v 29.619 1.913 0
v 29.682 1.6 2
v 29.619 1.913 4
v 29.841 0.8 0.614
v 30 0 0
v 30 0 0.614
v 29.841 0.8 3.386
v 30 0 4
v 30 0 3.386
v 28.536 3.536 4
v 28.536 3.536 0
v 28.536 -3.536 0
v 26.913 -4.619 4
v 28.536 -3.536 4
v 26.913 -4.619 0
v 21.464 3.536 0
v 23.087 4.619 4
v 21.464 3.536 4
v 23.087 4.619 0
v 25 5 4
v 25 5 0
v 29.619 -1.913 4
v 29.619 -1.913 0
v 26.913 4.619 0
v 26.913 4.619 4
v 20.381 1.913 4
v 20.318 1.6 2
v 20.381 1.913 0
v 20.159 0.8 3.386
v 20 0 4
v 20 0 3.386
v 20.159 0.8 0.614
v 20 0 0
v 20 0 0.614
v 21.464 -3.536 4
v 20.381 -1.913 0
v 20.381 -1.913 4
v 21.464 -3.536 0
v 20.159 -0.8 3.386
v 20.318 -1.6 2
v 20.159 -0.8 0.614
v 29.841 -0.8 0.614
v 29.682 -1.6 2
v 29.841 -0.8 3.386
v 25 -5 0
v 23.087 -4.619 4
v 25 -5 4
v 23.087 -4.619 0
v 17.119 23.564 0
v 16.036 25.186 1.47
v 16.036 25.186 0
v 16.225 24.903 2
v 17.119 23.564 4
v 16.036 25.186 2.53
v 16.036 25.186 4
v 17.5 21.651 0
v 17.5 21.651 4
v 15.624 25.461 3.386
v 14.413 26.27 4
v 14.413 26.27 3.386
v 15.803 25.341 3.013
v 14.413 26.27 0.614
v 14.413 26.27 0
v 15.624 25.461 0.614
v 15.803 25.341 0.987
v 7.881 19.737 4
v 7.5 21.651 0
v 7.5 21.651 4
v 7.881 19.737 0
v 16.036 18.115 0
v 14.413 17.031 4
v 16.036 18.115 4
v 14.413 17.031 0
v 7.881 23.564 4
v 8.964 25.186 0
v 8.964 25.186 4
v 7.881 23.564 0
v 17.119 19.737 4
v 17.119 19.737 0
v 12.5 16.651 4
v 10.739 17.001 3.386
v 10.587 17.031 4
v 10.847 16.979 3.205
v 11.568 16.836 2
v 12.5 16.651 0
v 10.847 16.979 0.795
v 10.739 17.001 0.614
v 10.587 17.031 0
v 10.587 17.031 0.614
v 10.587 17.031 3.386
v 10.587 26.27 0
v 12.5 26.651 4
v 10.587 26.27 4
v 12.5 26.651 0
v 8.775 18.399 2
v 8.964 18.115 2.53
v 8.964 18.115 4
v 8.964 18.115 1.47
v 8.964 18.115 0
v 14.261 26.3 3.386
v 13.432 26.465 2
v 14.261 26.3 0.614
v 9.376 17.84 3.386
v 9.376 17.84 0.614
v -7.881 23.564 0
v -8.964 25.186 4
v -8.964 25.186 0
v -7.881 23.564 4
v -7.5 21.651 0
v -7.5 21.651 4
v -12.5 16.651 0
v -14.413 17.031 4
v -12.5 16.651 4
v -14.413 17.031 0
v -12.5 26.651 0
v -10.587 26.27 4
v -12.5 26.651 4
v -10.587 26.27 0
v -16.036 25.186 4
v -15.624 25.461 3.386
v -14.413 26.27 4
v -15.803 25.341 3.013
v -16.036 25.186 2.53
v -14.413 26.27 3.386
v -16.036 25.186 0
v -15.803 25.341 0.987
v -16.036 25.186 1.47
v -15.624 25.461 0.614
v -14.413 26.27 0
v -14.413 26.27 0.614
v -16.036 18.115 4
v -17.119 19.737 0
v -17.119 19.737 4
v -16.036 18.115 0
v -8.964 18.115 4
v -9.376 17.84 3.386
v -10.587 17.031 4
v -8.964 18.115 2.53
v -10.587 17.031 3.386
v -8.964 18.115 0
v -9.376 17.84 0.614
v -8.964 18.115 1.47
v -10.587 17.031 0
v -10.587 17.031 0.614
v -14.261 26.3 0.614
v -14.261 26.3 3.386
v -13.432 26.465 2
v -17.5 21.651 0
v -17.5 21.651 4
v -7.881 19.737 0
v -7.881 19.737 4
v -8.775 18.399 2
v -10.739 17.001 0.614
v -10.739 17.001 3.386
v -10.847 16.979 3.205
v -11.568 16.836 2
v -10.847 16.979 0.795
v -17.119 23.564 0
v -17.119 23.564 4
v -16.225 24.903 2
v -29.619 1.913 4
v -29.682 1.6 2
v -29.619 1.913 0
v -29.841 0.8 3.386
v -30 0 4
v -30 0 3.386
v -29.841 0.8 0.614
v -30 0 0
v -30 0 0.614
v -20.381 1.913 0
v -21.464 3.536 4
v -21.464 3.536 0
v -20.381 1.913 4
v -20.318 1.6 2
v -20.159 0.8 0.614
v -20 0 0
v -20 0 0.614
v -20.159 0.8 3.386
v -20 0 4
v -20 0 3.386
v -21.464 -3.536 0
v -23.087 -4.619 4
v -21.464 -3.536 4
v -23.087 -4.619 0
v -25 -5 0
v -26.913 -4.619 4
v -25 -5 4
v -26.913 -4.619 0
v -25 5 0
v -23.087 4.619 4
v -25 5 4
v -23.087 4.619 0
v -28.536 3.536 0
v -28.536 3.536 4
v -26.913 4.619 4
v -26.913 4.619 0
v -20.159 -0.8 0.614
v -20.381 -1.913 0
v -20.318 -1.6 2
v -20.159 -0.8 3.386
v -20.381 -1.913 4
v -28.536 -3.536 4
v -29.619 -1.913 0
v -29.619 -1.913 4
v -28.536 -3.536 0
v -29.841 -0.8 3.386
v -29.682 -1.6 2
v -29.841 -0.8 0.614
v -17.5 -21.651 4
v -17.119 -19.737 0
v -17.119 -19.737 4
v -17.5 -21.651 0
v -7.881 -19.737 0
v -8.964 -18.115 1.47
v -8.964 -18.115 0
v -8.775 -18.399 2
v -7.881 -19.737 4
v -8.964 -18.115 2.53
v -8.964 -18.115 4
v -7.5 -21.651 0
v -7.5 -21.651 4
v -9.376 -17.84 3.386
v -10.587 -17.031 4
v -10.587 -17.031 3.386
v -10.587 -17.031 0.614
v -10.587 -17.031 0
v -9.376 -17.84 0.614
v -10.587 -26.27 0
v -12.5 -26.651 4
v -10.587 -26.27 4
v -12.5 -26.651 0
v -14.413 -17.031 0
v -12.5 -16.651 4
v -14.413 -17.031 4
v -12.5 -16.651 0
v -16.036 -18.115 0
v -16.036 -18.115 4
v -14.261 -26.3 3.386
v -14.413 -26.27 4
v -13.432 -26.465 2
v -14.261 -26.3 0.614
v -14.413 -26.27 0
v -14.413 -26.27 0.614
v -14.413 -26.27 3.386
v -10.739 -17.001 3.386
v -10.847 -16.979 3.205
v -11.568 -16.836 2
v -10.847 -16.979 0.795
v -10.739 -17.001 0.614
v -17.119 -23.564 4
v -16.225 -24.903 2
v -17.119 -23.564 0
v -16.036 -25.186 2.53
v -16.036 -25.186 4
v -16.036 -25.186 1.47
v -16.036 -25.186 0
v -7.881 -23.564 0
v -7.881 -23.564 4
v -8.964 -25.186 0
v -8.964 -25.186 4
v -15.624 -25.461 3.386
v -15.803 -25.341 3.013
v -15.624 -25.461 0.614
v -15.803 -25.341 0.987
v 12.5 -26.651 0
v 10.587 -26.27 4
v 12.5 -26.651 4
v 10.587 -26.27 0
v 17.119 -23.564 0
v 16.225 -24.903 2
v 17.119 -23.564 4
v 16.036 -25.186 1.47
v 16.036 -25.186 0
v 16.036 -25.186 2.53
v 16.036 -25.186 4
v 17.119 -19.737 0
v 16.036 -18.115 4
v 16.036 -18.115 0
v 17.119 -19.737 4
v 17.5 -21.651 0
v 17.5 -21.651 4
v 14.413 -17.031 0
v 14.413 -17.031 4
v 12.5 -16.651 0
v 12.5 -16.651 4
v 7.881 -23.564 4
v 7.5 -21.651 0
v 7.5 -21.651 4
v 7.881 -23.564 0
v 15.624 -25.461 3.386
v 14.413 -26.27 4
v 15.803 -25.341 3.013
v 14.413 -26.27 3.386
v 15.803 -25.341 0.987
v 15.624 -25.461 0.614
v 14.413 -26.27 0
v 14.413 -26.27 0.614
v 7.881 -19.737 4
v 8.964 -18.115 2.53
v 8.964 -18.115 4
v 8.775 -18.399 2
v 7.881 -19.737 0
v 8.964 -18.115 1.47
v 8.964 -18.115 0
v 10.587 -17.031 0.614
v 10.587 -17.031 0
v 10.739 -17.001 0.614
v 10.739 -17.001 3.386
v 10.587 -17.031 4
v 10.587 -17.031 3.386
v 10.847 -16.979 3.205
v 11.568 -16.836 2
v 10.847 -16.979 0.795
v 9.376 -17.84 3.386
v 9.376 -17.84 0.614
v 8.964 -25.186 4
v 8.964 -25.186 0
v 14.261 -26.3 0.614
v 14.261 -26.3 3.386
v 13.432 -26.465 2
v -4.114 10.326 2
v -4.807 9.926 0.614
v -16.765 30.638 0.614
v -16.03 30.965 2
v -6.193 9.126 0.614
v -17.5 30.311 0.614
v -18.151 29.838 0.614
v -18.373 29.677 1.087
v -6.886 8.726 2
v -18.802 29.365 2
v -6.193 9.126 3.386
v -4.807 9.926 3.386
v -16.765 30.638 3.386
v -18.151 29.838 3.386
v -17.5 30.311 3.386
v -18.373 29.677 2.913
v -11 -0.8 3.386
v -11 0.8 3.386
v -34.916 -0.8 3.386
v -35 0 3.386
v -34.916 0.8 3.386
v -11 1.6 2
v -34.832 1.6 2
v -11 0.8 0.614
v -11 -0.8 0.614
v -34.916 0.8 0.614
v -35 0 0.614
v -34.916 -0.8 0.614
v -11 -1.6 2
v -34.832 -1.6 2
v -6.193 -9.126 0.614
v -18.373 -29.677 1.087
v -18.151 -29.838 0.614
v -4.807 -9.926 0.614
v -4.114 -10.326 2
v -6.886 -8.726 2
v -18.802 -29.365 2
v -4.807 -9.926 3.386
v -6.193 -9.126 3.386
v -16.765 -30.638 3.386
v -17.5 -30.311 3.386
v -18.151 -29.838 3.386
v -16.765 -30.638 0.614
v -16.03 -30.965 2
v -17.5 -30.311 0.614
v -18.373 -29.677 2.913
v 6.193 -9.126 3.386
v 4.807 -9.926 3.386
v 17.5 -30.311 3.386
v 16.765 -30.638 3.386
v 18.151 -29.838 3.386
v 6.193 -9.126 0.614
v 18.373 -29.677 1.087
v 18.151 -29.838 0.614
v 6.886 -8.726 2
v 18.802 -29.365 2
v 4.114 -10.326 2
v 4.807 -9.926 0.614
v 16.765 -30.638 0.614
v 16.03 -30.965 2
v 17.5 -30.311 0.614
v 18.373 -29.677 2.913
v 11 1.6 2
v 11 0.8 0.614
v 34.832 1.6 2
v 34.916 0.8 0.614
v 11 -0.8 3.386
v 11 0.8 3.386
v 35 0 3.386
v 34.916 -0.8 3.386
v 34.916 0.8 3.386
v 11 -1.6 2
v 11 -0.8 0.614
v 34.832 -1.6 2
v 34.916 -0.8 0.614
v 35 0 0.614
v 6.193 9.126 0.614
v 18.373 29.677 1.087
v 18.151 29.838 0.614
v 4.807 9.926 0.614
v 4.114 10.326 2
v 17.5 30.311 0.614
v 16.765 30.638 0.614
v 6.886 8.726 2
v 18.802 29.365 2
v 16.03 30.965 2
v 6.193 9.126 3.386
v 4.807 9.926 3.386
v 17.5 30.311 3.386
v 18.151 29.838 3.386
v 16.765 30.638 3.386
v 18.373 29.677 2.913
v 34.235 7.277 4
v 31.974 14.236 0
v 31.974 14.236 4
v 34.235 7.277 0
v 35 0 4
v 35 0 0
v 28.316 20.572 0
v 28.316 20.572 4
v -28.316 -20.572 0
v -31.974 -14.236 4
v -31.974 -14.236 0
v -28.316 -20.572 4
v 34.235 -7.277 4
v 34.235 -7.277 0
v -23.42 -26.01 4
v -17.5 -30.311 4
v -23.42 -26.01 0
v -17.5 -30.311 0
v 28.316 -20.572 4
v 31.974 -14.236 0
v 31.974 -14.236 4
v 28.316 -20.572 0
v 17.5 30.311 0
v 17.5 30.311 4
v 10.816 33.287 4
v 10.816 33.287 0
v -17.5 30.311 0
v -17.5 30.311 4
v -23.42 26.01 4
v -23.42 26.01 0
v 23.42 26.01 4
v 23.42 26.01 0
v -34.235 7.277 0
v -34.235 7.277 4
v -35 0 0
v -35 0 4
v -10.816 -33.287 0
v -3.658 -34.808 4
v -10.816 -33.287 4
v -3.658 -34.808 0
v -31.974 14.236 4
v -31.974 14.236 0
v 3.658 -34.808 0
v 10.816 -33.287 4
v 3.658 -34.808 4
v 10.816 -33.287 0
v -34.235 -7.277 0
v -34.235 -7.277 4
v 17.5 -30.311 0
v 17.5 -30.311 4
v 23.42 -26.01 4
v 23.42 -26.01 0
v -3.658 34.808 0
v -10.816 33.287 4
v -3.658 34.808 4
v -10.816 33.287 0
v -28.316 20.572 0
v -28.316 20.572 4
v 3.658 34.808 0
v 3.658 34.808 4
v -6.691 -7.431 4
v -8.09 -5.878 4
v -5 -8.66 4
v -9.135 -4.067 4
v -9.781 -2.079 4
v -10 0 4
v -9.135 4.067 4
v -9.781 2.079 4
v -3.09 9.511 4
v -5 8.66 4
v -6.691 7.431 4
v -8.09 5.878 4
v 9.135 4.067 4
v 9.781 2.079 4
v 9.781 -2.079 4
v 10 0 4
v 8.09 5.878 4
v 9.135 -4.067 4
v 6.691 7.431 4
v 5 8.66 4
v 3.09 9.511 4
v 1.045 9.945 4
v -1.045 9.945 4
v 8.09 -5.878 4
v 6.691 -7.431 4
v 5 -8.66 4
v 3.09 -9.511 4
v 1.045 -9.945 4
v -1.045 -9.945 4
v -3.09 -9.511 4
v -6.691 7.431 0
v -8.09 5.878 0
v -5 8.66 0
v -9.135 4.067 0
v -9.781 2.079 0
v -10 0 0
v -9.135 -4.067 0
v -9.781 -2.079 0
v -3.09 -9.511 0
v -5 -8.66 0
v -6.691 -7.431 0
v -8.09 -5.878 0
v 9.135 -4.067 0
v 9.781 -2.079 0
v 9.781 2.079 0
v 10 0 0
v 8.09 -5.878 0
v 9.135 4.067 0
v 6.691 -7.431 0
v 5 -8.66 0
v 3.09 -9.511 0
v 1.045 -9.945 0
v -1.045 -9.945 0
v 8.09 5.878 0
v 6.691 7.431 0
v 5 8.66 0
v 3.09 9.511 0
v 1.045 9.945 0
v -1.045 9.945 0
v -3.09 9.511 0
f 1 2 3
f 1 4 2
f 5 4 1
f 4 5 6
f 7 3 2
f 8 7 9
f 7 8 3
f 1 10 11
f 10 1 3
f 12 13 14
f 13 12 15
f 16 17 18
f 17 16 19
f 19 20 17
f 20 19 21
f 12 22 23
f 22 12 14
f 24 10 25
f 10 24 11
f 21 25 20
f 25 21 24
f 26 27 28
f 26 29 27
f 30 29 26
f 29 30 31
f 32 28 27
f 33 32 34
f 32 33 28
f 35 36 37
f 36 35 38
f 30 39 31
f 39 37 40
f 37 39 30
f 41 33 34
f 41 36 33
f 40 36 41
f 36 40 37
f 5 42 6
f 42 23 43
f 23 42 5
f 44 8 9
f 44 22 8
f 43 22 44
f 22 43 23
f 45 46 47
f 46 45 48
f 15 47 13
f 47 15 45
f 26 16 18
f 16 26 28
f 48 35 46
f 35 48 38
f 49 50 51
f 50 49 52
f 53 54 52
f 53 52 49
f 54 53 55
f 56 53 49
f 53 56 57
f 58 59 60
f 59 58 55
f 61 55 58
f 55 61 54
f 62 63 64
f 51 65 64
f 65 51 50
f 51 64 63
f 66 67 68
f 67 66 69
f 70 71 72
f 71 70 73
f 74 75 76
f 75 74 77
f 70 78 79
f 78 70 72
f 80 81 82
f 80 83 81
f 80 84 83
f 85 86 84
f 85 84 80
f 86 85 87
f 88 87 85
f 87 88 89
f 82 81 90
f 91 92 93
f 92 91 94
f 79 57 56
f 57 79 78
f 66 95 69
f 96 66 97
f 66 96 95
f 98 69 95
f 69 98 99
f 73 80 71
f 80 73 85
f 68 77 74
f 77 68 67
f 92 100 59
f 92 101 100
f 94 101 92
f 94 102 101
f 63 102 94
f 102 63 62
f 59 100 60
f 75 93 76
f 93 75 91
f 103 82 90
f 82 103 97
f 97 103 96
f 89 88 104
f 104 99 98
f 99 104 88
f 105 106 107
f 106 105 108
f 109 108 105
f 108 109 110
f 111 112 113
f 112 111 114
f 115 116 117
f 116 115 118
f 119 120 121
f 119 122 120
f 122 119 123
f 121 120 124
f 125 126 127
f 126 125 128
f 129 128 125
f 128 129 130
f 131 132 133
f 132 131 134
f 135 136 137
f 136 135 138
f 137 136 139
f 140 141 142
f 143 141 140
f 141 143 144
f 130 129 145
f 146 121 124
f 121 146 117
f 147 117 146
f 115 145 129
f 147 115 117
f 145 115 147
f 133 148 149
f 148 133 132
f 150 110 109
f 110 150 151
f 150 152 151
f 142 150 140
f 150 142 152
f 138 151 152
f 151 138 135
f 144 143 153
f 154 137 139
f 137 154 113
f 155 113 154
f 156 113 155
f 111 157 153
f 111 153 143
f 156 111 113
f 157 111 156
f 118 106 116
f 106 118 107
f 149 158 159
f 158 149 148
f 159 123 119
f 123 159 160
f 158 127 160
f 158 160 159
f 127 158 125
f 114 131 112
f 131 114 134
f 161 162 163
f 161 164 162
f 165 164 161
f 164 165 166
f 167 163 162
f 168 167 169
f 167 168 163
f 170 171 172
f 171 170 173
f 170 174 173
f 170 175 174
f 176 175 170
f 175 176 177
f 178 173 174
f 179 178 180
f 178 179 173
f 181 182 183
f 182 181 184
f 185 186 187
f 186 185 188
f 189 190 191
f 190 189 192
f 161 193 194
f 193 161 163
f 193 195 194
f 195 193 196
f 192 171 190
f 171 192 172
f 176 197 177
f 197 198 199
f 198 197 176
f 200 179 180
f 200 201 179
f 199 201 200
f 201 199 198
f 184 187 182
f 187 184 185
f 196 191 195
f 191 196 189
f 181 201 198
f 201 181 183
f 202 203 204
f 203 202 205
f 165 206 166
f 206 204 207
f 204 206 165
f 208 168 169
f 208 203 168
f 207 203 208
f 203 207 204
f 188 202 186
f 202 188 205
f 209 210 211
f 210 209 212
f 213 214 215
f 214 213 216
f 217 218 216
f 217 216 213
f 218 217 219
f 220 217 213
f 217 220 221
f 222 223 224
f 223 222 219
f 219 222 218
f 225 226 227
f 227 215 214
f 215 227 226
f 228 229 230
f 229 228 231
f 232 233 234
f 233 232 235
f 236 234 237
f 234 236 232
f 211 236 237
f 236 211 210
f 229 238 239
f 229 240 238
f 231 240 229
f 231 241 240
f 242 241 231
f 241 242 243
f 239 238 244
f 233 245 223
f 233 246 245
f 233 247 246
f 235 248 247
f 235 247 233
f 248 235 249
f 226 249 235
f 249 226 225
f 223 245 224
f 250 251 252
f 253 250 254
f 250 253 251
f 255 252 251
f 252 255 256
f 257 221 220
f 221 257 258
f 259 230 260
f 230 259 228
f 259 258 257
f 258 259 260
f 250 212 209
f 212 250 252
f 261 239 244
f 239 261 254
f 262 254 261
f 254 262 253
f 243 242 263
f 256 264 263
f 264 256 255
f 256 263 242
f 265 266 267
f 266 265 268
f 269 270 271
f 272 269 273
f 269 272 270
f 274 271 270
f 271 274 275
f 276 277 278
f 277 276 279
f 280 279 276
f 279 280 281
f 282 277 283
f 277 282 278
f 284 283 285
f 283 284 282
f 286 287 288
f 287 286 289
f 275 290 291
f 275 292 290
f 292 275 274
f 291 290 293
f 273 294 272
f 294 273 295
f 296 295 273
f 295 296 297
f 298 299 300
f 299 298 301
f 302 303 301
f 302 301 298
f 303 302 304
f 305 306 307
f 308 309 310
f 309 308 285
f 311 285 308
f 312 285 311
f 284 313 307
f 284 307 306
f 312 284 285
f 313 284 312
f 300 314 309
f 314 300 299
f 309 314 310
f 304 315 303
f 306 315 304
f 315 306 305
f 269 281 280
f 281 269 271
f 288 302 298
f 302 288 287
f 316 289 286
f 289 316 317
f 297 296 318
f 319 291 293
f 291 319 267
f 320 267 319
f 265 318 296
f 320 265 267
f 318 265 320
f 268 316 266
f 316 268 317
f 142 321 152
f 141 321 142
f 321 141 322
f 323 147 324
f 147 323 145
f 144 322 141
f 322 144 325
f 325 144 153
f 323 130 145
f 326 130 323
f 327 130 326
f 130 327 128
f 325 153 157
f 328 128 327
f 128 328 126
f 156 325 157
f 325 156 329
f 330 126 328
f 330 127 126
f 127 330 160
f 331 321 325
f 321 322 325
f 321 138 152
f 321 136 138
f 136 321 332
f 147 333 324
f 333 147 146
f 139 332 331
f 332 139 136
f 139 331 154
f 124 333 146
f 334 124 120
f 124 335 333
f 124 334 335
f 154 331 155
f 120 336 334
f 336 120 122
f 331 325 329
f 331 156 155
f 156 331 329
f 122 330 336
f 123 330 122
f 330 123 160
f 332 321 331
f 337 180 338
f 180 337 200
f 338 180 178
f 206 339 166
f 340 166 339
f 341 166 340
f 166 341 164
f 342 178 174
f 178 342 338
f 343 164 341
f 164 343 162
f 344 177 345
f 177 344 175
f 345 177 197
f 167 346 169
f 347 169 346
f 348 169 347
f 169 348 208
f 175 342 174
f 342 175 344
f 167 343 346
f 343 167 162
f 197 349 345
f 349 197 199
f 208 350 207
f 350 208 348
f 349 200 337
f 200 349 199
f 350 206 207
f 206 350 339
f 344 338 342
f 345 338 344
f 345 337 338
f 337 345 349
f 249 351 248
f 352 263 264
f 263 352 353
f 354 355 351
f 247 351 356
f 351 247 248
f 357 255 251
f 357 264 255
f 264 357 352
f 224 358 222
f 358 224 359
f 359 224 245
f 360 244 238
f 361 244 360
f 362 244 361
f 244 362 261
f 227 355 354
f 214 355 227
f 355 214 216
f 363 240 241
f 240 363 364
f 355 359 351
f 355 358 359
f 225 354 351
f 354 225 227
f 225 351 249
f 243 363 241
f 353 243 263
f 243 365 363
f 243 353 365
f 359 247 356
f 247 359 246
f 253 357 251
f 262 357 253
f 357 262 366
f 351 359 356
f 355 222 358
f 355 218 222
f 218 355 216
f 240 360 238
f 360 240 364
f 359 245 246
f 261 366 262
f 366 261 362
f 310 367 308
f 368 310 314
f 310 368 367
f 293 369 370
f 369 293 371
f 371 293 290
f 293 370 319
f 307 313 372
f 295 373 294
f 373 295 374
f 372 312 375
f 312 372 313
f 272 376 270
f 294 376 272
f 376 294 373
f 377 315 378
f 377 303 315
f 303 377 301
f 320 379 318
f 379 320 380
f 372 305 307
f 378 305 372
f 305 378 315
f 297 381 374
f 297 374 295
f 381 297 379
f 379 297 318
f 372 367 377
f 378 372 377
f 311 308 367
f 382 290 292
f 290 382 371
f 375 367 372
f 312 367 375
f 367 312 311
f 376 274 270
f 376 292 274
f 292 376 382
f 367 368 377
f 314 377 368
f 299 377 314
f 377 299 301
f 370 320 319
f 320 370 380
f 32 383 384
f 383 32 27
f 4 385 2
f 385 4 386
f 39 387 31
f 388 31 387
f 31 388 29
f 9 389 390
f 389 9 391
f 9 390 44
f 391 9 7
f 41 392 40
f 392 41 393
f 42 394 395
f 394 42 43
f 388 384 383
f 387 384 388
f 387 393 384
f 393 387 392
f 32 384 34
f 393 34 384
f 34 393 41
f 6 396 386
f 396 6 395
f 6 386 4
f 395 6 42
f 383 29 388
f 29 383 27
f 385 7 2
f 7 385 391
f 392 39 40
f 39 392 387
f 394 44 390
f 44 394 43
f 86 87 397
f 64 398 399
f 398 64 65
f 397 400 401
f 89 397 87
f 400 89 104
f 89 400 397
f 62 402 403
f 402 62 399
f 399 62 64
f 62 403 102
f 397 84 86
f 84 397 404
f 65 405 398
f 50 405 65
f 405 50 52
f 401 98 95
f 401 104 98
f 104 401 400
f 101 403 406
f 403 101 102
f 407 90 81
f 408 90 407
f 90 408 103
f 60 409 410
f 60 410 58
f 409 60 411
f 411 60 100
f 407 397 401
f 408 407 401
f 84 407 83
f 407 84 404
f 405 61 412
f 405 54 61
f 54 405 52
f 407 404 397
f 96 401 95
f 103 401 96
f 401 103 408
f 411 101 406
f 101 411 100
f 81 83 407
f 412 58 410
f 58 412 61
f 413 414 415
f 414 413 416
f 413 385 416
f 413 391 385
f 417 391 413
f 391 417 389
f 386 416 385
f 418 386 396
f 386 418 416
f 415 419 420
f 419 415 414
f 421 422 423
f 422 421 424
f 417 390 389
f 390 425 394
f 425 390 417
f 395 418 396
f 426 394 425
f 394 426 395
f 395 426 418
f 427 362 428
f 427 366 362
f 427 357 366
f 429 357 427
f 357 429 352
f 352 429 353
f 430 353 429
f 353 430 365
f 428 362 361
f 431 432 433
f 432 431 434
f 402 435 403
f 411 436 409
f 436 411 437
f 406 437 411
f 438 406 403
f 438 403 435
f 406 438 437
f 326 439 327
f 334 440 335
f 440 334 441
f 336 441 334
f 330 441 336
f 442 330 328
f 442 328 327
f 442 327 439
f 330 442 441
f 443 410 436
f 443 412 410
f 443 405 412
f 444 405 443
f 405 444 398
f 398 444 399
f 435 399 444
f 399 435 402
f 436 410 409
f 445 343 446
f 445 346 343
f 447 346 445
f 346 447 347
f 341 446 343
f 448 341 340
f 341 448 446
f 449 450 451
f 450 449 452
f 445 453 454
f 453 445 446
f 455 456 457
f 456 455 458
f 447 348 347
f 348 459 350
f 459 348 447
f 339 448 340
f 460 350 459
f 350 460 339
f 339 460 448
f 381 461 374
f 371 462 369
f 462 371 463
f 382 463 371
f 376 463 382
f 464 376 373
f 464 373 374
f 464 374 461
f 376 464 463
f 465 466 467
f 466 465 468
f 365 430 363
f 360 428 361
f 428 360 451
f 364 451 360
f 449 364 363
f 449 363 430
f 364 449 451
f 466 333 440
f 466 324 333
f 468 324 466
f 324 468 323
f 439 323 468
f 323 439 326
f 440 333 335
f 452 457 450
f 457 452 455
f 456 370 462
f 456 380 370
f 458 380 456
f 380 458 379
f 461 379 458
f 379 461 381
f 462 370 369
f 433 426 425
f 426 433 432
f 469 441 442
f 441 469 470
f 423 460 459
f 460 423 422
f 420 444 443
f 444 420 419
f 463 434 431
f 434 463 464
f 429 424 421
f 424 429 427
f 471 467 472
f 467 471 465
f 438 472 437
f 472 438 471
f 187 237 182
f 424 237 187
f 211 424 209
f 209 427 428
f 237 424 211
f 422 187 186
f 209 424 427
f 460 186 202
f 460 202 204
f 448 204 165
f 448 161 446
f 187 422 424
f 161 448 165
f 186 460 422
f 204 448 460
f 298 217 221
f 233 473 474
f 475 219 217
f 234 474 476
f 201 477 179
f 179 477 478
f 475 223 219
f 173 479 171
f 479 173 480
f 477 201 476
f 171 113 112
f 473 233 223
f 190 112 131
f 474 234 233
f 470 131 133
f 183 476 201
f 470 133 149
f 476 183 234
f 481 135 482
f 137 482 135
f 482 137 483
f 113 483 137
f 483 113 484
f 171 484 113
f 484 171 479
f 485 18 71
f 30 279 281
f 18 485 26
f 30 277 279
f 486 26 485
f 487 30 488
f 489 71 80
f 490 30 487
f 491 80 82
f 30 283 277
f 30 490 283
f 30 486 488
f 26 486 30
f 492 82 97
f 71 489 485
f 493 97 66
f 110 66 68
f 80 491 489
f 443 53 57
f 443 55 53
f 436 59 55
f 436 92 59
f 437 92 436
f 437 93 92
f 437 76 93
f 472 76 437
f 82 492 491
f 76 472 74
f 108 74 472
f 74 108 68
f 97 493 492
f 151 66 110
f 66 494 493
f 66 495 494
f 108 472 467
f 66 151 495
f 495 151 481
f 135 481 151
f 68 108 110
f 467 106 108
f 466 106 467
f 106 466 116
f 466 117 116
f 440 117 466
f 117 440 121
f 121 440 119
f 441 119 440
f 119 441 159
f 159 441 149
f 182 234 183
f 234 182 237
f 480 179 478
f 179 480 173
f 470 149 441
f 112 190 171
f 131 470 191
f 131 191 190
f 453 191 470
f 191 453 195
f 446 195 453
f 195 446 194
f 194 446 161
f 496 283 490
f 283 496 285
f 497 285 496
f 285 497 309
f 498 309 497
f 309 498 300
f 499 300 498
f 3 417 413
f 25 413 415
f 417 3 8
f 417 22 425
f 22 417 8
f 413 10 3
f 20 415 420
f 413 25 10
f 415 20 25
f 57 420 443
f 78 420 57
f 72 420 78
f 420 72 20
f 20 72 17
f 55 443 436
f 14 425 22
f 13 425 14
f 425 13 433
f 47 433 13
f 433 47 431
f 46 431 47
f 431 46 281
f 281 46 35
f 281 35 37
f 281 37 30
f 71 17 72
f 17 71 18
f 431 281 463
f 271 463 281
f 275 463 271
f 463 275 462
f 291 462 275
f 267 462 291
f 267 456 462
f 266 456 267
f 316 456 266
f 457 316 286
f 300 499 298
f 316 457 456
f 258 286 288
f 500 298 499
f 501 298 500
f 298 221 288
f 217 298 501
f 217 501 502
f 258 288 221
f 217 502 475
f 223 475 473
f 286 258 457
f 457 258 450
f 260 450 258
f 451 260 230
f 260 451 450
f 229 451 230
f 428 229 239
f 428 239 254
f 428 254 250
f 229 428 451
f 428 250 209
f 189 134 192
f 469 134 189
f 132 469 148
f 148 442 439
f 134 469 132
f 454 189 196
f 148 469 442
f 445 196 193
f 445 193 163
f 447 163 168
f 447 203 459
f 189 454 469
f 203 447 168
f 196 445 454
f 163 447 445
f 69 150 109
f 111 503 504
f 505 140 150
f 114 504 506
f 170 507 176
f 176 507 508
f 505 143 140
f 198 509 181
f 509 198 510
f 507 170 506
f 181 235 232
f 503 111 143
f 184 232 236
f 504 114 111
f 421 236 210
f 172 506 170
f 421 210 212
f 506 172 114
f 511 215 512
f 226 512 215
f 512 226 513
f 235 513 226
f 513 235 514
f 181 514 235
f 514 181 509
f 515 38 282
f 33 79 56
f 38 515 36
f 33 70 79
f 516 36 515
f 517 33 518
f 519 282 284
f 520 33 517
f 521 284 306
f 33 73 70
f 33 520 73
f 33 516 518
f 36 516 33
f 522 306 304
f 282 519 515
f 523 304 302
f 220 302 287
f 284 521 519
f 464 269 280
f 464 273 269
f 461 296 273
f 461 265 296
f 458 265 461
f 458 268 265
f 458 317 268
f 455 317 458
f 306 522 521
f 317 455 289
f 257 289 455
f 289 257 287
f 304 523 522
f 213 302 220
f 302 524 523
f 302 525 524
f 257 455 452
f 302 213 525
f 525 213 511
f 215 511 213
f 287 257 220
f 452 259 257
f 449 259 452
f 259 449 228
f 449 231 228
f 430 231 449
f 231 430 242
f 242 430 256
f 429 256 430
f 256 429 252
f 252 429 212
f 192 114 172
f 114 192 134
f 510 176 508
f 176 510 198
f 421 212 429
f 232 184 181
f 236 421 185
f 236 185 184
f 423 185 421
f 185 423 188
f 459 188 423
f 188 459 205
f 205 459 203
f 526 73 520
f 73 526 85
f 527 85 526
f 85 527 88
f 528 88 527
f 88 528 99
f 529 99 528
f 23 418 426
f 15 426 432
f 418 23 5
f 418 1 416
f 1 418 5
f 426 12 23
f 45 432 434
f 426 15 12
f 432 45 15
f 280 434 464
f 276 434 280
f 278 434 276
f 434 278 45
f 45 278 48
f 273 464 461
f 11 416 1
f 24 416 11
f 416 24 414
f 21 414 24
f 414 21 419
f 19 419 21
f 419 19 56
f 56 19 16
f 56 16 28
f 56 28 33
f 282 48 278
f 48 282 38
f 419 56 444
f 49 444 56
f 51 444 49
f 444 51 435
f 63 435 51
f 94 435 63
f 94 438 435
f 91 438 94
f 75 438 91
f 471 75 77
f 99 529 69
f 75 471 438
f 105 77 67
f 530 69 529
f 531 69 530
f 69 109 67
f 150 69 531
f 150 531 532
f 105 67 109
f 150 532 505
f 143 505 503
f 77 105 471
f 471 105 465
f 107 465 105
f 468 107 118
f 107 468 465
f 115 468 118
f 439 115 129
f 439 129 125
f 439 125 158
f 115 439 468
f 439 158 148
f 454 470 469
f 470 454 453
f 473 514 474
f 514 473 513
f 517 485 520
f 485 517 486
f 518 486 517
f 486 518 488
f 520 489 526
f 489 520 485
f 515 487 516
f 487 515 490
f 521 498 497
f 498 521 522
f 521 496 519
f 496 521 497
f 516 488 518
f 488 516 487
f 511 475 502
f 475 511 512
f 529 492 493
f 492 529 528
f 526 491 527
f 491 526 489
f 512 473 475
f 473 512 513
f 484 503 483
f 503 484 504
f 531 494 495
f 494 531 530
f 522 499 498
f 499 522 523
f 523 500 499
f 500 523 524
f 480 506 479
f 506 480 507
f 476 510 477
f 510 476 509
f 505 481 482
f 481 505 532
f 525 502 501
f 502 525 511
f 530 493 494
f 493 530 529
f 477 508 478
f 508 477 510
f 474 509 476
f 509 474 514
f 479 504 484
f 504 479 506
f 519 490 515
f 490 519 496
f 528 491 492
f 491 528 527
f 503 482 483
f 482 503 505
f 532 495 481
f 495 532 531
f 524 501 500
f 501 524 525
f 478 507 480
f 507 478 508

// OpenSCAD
// Parameters
discHeight = 4;
outerDiam = 70;
centerAxisDiam = 20;
centerWallThickness = 1;
outerAxisDiam = 10;
outerAxisRadius = 25;
magnetDiameter = 3.2;

module base() {
    cylinder(discHeight, outerDiam/2, outerDiam/2);
}

module centerAxis() {
    translate([0, 0, -1])
    cylinder(discHeight+2, centerAxisDiam/2, centerAxisDiam/2);
}

module outerAxis() {
    for (i = [0:5]) {
        translate([outerAxisRadius*cos(i*60), outerAxisRadius*sin(i*60), -1])
        cylinder(discHeight+2, outerAxisDiam/2, outerAxisDiam/2);
    }
}

module batteryCavity() {
    for (i = [0:5]) {
        translate([0, 0, discHeight/2])
        rotate([-90, 0, i*60+30])
        translate([0, 0, centerAxisDiam/2+centerWallThickness])
        cylinder(outerDiam, magnetDiameter/2, magnetDiameter/2);
    }
}

module main() {
    difference() {
        base();
        centerAxis();
        outerAxis();
        batteryCavity();
    }
}

main();
//batteryCavity();

echo(str("Magnet stack length: ", outerAxisRadius-outerAxisDiam/2-centerAxisDiam/2-centerWallThickness, " mm"));
